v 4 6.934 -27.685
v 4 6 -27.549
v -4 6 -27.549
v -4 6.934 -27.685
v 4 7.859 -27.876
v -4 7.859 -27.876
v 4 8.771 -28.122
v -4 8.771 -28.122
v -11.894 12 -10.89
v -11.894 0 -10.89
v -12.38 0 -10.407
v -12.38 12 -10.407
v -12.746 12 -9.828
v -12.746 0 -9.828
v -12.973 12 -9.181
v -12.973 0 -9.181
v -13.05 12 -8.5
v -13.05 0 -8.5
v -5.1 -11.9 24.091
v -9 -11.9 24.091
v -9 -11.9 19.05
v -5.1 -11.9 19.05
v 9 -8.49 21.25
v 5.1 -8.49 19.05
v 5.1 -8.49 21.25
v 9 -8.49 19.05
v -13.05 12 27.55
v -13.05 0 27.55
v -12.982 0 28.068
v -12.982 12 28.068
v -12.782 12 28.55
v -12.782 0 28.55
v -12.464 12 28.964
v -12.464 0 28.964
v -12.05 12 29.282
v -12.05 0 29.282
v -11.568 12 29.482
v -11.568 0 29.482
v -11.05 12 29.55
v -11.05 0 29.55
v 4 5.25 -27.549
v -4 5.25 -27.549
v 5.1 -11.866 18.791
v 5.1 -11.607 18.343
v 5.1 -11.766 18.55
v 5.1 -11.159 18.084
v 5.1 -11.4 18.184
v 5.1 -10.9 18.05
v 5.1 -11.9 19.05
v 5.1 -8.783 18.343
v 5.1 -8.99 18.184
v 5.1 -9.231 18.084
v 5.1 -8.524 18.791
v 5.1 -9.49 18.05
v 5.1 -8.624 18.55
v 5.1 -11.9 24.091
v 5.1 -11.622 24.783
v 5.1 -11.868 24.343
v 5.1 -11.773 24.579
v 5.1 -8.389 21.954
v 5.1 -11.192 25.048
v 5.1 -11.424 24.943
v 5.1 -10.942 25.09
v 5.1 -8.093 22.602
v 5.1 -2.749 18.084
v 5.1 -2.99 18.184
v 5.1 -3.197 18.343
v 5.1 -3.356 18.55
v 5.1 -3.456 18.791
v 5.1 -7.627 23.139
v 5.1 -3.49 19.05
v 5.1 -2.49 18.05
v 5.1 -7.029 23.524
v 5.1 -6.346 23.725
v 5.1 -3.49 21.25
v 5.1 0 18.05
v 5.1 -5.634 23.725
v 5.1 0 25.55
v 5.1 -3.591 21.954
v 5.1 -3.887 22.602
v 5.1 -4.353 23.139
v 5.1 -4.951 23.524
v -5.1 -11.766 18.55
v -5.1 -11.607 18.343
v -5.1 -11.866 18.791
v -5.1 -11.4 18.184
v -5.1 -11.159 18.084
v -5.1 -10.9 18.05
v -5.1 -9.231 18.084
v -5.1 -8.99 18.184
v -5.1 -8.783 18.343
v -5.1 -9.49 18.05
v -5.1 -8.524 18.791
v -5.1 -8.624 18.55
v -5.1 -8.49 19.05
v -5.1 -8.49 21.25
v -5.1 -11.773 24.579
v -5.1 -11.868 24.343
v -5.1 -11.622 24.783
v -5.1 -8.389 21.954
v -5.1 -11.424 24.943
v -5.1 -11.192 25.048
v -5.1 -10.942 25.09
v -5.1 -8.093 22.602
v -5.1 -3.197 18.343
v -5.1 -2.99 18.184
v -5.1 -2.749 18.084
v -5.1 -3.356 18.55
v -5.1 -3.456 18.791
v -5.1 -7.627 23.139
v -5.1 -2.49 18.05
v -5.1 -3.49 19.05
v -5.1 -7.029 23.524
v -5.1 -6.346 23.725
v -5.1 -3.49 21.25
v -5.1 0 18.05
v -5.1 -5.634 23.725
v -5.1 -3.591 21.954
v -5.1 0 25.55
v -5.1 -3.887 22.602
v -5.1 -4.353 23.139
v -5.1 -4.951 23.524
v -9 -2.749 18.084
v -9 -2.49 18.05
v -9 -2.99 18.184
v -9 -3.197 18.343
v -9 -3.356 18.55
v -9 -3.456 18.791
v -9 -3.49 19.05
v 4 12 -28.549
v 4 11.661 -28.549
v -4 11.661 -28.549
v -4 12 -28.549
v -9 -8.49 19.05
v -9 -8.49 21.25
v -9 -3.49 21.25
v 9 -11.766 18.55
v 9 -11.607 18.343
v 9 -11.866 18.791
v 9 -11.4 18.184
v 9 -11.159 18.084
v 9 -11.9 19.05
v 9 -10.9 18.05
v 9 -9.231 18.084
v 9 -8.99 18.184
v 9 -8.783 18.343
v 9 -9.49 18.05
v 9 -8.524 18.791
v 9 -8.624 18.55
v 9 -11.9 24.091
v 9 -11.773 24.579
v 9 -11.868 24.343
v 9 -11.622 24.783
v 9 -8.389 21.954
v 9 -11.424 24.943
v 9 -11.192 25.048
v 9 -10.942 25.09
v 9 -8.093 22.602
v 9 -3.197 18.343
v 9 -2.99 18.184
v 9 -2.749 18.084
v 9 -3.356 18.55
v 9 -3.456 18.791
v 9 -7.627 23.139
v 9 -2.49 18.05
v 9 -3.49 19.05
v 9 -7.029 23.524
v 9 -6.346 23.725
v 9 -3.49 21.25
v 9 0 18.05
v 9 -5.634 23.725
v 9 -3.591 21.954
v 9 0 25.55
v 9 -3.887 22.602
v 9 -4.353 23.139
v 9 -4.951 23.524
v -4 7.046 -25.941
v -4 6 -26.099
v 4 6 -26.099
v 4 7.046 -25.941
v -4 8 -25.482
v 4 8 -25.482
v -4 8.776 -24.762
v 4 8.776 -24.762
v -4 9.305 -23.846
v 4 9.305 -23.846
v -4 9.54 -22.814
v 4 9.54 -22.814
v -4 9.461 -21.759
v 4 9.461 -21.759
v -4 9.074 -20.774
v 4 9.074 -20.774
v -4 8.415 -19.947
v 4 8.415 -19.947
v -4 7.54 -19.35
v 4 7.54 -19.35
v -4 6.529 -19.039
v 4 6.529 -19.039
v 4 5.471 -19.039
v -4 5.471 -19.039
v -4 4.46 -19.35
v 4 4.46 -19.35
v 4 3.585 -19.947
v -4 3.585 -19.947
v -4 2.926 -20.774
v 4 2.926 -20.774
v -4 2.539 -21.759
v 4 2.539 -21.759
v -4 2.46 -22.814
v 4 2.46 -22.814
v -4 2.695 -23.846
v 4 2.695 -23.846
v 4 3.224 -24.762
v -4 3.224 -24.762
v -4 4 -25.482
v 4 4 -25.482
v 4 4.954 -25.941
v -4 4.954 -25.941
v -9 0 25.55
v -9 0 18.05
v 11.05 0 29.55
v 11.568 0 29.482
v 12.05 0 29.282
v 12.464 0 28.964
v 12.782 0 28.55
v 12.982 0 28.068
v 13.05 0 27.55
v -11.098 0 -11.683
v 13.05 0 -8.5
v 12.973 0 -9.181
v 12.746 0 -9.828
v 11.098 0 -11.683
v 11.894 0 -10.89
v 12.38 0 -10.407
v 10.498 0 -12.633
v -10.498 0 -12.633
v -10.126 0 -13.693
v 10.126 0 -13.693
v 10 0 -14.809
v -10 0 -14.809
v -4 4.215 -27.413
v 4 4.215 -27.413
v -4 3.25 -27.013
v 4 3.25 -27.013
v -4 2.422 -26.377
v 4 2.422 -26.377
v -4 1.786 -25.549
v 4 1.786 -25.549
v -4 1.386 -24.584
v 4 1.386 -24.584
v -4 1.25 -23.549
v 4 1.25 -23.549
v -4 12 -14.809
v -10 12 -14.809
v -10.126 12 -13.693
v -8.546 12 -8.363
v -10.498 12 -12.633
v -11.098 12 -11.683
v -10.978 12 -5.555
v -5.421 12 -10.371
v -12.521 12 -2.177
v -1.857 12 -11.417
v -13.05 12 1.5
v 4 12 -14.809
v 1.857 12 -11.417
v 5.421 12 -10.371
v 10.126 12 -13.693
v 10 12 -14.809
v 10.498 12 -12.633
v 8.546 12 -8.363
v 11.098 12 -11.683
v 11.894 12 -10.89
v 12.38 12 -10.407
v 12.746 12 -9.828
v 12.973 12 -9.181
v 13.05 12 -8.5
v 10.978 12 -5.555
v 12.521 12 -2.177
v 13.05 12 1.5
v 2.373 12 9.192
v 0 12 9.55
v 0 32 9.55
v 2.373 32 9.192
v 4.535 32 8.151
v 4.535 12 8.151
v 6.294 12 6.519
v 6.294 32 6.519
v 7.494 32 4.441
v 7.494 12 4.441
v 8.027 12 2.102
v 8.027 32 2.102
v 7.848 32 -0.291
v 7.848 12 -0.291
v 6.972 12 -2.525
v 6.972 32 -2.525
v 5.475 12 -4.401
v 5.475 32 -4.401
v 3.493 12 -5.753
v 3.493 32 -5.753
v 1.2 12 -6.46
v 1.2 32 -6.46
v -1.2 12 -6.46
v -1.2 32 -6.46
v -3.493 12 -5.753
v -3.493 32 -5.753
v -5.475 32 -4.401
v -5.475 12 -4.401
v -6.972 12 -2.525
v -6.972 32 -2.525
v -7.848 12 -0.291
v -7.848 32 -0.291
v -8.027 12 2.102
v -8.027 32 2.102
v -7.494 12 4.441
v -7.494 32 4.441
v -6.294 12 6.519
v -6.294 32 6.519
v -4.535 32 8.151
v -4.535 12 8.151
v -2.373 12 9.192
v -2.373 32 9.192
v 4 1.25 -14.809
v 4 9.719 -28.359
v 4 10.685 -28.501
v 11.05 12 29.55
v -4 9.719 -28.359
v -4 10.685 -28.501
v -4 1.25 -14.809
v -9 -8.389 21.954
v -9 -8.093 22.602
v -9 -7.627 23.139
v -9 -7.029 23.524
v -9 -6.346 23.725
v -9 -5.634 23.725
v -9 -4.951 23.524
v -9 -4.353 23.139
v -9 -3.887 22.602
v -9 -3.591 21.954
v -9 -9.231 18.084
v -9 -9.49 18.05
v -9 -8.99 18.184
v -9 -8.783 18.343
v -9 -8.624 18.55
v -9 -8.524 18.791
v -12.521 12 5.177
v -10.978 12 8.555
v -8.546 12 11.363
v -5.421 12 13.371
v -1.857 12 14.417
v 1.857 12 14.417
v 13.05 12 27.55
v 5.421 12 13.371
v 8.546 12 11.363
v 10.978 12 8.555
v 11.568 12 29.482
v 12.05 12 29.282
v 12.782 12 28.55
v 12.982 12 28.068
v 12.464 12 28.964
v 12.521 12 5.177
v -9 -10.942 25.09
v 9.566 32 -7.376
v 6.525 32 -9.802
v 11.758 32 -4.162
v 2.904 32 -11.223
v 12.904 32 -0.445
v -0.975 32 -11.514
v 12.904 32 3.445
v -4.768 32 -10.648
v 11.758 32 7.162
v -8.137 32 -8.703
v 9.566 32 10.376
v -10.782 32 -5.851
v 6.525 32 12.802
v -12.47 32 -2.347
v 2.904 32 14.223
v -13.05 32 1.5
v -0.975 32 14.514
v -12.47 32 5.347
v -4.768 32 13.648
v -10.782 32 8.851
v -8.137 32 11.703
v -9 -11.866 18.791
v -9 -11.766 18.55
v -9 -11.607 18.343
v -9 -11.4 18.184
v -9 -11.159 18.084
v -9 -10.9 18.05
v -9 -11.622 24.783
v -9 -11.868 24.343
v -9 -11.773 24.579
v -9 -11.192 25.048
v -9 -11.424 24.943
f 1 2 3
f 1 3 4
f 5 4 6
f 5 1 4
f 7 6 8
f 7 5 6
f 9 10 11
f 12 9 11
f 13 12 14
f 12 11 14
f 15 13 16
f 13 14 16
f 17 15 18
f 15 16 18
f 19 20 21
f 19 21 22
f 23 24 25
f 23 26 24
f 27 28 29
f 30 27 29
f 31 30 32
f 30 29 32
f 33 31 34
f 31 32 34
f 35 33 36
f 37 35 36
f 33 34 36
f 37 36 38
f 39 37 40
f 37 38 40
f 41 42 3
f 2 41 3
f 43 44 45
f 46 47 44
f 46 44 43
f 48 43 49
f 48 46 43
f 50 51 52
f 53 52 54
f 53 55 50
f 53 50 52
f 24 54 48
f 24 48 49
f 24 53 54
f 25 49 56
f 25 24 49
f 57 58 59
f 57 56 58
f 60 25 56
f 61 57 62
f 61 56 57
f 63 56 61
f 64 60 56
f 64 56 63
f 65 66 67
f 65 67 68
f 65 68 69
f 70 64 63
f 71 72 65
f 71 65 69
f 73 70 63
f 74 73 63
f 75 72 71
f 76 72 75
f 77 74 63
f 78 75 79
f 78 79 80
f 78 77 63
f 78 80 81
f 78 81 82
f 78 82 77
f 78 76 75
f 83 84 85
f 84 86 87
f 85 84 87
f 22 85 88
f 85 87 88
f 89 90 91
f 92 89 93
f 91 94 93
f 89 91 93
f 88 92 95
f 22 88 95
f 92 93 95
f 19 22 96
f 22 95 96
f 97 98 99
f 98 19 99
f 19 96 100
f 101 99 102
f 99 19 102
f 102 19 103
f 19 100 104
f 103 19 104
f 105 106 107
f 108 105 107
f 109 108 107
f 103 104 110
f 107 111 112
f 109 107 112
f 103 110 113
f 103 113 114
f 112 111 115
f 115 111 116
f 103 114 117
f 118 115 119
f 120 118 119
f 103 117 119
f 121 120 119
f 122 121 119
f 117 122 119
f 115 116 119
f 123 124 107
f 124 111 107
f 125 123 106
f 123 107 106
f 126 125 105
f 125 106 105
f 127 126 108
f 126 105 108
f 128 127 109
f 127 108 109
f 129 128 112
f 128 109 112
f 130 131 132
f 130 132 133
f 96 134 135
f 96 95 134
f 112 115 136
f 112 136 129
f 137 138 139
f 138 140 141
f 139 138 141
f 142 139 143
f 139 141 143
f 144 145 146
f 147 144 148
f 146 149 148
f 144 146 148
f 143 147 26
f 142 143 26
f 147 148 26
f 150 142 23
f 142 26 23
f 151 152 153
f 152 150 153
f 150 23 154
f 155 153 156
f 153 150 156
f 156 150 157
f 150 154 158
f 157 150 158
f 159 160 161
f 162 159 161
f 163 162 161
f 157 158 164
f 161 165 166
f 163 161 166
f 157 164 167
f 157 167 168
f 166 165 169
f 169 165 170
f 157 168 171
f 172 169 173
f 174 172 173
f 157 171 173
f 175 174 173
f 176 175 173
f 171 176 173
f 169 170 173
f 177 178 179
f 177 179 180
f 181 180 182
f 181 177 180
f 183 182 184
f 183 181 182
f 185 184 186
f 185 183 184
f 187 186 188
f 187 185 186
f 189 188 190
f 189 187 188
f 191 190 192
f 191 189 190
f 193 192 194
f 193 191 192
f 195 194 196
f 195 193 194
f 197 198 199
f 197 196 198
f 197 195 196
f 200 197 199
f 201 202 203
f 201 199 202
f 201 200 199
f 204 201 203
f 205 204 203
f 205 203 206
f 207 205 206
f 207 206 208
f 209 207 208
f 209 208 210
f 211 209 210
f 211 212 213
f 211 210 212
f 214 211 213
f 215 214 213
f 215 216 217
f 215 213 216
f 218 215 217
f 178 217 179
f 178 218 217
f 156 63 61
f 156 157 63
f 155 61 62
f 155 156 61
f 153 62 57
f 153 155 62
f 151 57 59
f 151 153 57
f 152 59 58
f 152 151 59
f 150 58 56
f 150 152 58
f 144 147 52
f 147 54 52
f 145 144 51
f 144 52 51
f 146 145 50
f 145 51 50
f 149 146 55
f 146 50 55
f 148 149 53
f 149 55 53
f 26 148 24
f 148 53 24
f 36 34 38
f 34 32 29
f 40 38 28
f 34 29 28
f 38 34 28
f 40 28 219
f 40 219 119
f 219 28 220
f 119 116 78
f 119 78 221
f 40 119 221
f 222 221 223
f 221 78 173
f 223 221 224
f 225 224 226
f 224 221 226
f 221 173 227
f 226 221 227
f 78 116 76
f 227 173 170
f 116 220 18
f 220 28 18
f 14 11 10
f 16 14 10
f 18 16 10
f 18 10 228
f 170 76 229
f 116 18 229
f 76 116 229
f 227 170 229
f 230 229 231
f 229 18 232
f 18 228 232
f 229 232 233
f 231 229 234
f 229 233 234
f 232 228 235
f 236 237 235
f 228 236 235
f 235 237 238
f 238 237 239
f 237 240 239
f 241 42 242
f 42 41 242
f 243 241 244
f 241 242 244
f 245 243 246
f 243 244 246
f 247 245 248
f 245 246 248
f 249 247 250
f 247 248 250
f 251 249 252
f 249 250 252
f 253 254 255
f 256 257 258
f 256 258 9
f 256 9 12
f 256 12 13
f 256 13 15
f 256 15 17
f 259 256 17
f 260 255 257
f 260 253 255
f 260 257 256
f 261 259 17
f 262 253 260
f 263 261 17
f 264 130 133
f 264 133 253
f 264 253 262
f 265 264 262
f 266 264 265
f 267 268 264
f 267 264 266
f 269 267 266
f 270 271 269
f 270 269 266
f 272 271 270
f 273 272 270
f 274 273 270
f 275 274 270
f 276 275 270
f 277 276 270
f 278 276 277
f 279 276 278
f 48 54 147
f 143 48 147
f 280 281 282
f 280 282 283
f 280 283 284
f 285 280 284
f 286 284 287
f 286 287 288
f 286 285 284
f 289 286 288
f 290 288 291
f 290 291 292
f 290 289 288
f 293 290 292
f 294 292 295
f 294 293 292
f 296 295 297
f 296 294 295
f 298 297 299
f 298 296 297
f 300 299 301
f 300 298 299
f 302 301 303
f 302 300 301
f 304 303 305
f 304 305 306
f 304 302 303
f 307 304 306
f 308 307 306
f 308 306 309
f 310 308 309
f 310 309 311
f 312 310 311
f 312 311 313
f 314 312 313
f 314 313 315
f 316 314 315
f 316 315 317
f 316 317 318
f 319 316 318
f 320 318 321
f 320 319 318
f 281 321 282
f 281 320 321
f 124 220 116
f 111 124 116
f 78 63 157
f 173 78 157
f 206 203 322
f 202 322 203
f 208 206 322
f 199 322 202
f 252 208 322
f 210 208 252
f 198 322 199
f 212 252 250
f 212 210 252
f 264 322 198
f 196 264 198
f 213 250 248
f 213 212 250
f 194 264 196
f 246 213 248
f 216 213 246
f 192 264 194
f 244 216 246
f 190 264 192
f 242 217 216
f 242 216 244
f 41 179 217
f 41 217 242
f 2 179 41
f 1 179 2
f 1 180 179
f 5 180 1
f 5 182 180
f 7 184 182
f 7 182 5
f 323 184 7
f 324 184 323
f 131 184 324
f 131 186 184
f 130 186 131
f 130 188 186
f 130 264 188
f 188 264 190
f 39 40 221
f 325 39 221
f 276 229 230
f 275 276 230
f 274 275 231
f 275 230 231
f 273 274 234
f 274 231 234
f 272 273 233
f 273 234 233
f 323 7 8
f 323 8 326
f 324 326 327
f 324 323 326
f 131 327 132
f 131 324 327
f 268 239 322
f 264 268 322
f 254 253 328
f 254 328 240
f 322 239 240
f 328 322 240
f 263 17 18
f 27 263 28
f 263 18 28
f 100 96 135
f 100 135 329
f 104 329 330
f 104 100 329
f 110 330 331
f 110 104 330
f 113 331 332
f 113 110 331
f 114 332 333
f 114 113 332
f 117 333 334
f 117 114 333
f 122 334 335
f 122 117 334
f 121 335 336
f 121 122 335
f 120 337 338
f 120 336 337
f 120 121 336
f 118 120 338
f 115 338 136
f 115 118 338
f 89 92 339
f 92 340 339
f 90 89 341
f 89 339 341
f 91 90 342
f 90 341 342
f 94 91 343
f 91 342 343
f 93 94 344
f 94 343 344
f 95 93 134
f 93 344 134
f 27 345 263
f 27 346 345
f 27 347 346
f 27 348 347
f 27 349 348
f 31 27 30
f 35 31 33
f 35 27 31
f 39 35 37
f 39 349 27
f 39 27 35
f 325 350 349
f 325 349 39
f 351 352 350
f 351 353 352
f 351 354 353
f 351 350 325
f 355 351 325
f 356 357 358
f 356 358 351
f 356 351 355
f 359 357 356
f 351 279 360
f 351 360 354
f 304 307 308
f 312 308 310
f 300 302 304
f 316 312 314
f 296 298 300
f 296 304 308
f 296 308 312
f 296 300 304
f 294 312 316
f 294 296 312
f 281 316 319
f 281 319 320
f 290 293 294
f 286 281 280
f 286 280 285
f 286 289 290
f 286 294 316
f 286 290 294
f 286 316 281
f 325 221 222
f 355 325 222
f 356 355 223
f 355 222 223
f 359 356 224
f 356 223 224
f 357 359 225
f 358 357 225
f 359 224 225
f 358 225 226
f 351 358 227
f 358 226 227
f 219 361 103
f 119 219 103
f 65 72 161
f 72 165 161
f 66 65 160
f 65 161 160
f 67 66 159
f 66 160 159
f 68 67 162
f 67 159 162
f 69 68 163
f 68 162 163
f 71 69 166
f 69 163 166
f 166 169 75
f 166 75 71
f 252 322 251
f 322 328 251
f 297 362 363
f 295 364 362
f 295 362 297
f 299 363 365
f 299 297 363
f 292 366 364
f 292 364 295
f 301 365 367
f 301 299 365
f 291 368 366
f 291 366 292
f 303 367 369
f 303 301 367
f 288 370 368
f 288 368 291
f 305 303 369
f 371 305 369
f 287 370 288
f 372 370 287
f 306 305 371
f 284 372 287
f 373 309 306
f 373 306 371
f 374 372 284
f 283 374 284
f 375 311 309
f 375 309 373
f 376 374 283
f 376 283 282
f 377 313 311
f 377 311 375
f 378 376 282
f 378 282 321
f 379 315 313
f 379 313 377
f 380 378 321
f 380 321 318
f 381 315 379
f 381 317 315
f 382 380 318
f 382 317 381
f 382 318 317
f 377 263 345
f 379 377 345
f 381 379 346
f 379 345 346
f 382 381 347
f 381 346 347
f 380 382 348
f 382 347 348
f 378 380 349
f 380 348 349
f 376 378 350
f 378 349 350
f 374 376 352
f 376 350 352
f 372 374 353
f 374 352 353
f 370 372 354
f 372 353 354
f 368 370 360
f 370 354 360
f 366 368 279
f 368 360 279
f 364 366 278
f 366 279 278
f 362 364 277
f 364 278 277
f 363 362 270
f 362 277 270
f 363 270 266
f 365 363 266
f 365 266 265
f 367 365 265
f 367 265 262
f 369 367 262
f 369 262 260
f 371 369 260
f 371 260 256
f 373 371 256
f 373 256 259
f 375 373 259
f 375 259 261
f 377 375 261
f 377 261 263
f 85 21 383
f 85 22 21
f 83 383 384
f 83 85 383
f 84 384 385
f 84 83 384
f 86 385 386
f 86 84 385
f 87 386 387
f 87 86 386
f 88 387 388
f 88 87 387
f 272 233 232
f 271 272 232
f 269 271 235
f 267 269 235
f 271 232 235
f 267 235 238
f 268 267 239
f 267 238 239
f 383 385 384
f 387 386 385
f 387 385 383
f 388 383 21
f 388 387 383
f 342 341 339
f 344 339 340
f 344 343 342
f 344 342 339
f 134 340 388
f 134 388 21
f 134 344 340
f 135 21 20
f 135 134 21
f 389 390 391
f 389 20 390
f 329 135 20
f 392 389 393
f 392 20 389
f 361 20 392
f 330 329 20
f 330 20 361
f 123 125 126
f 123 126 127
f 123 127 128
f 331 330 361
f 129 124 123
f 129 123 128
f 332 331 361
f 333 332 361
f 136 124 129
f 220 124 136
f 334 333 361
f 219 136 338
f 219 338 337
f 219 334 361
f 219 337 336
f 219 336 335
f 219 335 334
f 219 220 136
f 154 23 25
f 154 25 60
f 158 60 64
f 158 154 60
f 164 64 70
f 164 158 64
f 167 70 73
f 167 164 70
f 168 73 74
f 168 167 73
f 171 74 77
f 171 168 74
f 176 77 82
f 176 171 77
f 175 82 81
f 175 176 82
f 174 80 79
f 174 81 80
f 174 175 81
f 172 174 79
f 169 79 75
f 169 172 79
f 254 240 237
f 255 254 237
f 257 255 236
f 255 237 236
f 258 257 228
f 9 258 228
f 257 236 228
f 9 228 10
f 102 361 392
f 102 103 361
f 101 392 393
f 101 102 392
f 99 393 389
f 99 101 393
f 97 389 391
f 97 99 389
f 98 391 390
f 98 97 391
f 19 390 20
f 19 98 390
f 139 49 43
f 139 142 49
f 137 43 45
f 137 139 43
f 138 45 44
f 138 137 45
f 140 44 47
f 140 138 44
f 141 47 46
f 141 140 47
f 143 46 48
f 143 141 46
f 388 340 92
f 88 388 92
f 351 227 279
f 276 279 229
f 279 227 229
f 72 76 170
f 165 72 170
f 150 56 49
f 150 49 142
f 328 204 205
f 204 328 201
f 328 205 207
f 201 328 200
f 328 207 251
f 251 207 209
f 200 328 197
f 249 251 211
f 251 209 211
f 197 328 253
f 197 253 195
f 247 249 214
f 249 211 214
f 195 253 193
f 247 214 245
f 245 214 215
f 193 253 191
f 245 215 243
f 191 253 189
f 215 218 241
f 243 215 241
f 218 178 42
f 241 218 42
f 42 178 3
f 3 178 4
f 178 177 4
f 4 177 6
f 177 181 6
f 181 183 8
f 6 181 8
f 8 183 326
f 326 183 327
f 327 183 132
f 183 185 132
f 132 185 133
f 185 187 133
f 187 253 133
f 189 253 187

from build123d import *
from OCP.BRepFilletAPI import BRepFilletAPI_MakeChamfer

# Parameters (mm, degrees)
BOSS_EXTRUDE1_DEPTH     = 12
SKETCH2_W               = 8
SKETCH2_H               = 12
BOSS_EXTRUDE2_DEPTH     = 14.74
CUT_EXTRUDE1_DEPTH      = 37.164969238
CUT_EXTRUDE1_DEPTH_BACK = 37.164969238
SKETCH3_W               = 14.74
SKETCH3_H               = 1.25
CUT_EXTRUDE2_DEPTH      = 37.164969238
CUT_EXTRUDE2_DEPTH_BACK = 37.164969238
SKETCH4_R               = 3.55
CUT_EXTRUDE3_DEPTH      = 37.164969238
CUT_EXTRUDE3_DEPTH_BACK = 37.164969238
SKETCH6_W               = 2
SKETCH6_H               = 10.75
FILLET1_R               = 4
BOSS_EXTRUDE3_DEPTH     = 8
SKETCH8_R               = 13.05
SKETCH8_R_2             = 8.05
BOSS_EXTRUDE4_DEPTH     = 20
SKETCH9_W               = 3.9
SKETCH9_H               = 7.5
BOSS_EXTRUDE5_DEPTH     = 11.9
CUT_EXTRUDE4_DEPTH      = 49.820129045
CUT_EXTRUDE4_DEPTH_BACK = 49.820129045
CHAMFER1_SIZE           = 11.9
CHAMFER1_SIZE_2         = 0.5
FILLET3_R               = 1


with BuildPart() as part:
    # Sketch1 → Boss-Extrude1 (new body)
    with BuildSketch(Plane(origin=(0, 0, 0), x_dir=(1, 0, 0), z_dir=(0, 1, 0))):
        with BuildLine():
            Line((-13.05, 8.5), (-13.05, -27.55))
            ThreePointArc((-13.05, -27.55), (-12.464213562, -28.964213562), (-11.05, -29.55))
            Line((-11.05, -29.55), (11.05, -29.55))
            ThreePointArc((11.05, -29.55), (12.464213562, -28.964213562), (13.05, -27.55))
            Line((13.05, -27.55), (13.05, 8.5))
            ThreePointArc((13.05, 8.5), (12.745947042, 9.827507004), (11.894409938, 10.890337003))
            ThreePointArc((11.894409938, 10.890337003), (10.498447473, 12.632681264), (10, 14.808922253))
            Line((10, 14.808922253), (-10, 14.808922253))
            ThreePointArc((-10, 14.808922253), (-10.498447473, 12.632681264), (-11.894409938, 10.890337003))
            ThreePointArc((-11.894409938, 10.890337003), (-12.745947042, 9.827507004), (-13.05, 8.5))
        make_face()
    extrude(amount=BOSS_EXTRUDE1_DEPTH)

    # Sketch2 → Boss-Extrude2 (add)
    with BuildSketch(Plane(origin=(0, 0, -14.808922253), x_dir=(-1, 0, 0), z_dir=(0, 0, -1))):
        with Locations((0, 6)):
            Rectangle(SKETCH2_W, SKETCH2_H)
    extrude(amount=BOSS_EXTRUDE2_DEPTH)

    # Sketch3 → Cut-Extrude1 (cut, two sides: drawn at the far end of the back side and taken through both)
    with BuildSketch(Plane(origin=(4, 0, 0), x_dir=(0, 0, -1), z_dir=(1, 0, 0)).offset(-CUT_EXTRUDE1_DEPTH_BACK)):
        with Locations((22.178922253, 0.625)):
            Rectangle(SKETCH3_W, SKETCH3_H)
    extrude(amount=CUT_EXTRUDE1_DEPTH + CUT_EXTRUDE1_DEPTH_BACK, mode=Mode.SUBTRACT)

    # Sketch4 → Cut-Extrude2 (cut, two sides: drawn at the far end of the back side and taken through both)
    with BuildSketch(Plane(origin=(4, 0, 0), x_dir=(0, 0, -1), z_dir=(1, 0, 0)).offset(-CUT_EXTRUDE2_DEPTH_BACK)):
        with Locations((22.548922253, 6)):
            Circle(SKETCH4_R)
    extrude(amount=CUT_EXTRUDE2_DEPTH + CUT_EXTRUDE2_DEPTH_BACK, mode=Mode.SUBTRACT)

    # Sketch6 → Cut-Extrude3 (cut, two sides: drawn at the far end of the back side and taken through both)
    with BuildSketch(Plane(origin=(4, 0, 0), x_dir=(0, 0, -1), z_dir=(1, 0, 0)).offset(-CUT_EXTRUDE3_DEPTH_BACK)):
        with Locations((28.548922253, 6.625)):
            Rectangle(SKETCH6_W, SKETCH6_H)
    extrude(amount=CUT_EXTRUDE3_DEPTH + CUT_EXTRUDE3_DEPTH_BACK, mode=Mode.SUBTRACT)

    # Fillet1
    fillet1_edges = [part.edges().sort_by_distance(p)[0] for p in [
        (0, 1.25, -27.548922253),
    ]]
    fillet(fillet1_edges, radius=FILLET1_R)

    # Sketch7 → Boss-Extrude3 (add)
    with BuildSketch(Plane(origin=(4, 0, 0), x_dir=(0, 0, -1), z_dir=(1, 0, 0))):
        with BuildLine():
            Line((27.548922253, 10), (27.548922253, 6))
            ThreePointArc((27.548922253, 6), (27.773781475, 7.398207316), (28.122230045, 8.770843088))
            ThreePointArc((28.122230045, 8.770843088), (28.441674093, 10.200150162), (28.548922253, 11.660787366))
            Line((28.548922253, 11.660787366), (28.548922253, 12))
            Line((28.548922253, 12), (27.548922253, 12))
            Line((27.548922253, 12), (27.548922253, 10))
        make_face()
    extrude(amount=-BOSS_EXTRUDE3_DEPTH)

    # Sketch8 → Boss-Extrude4 (add)
    with BuildSketch(Plane(origin=(0, 12, 0), x_dir=(1, 0, 0), z_dir=(0, 1, 0))):
        with Locations(Location((0, -1.5, 0), (0, 0, 180))):
            Circle(SKETCH8_R)
        with Locations(Location((0, -1.5, 0), (0, 0, 270))):
            Circle(SKETCH8_R_2, mode=Mode.SUBTRACT)
    extrude(amount=BOSS_EXTRUDE4_DEPTH)

    # Sketch9 → Boss-Extrude5 (add)
    with BuildSketch(Plane.XZ):
        with Locations((-7.05, 21.8)):
            Rectangle(SKETCH9_W, SKETCH9_H)
        with Locations((7.05, 21.8)):
            Rectangle(SKETCH9_W, SKETCH9_H)
    extrude(amount=BOSS_EXTRUDE5_DEPTH)

    # Sketch10 → Cut-Extrude4 (cut, two sides: drawn at the far end of the back side and taken through both)
    with BuildSketch(Plane.ZY.offset(9).offset(-CUT_EXTRUDE4_DEPTH_BACK)):
        with BuildLine():
            Line((21.25, -3.49), (13.718722393, -3.49))
            Line((13.718722393, -3.49), (13.718722393, -8.49))
            Line((13.718722393, -8.49), (21.25, -8.49))
            ThreePointArc((21.25, -8.49), (23.75, -5.99), (21.25, -3.49))
        make_face()
    extrude(amount=CUT_EXTRUDE4_DEPTH + CUT_EXTRUDE4_DEPTH_BACK, mode=Mode.SUBTRACT)

    # Chamfer1
    chamfer1_edges_1 = [part.edges().sort_by_distance(p)[0] for p in [
        (-7.05, -11.9, 25.55),
    ]]
    chamfer1_side_1 = [part.faces().sort_by_distance(p)[0] for p in [
        (-7.05, -11.89, 25.55),
    ]]
    chamfer1_edges_2 = [part.edges().sort_by_distance(p)[0] for p in [
        (7.05, -11.9, 25.55),
    ]]
    chamfer1_side_2 = [part.faces().sort_by_distance(p)[0] for p in [
        (7.05, -11.89, 25.55),
    ]]
    chamfer1 = BRepFilletAPI_MakeChamfer(part.part.solid().wrapped)
    for e in chamfer1_edges_1:
        chamfer1.Add(CHAMFER1_SIZE - 0.0001, CHAMFER1_SIZE_2 - 0.0001, e.wrapped, chamfer1_side_1[0].wrapped)
    for e in chamfer1_edges_2:
        chamfer1.Add(CHAMFER1_SIZE - 0.0001, CHAMFER1_SIZE_2 - 0.0001, e.wrapped, chamfer1_side_2[0].wrapped)
    add(Compound.cast(chamfer1.Shape()), mode=Mode.REPLACE)  # a hair under: the kernel refuses the full size

    # Fillet3
    fillet3_edges = [part.edges().sort_by_distance(p)[0] for p in [
        (-7.05, -11.9, 18.05),
        (7.05, -11.9, 18.05),
        (7.05, -8.49, 18.05),
        (-7.05, -8.49, 18.05),
        (7.05, -3.49, 18.05),
        (-7.05, -3.49, 18.05),
        (-7.05, -11.9, 25.0501),
        (7.05, -11.9, 25.0501),
    ]]
    fillet(fillet3_edges, radius=FILLET3_R)


solid = part.part
